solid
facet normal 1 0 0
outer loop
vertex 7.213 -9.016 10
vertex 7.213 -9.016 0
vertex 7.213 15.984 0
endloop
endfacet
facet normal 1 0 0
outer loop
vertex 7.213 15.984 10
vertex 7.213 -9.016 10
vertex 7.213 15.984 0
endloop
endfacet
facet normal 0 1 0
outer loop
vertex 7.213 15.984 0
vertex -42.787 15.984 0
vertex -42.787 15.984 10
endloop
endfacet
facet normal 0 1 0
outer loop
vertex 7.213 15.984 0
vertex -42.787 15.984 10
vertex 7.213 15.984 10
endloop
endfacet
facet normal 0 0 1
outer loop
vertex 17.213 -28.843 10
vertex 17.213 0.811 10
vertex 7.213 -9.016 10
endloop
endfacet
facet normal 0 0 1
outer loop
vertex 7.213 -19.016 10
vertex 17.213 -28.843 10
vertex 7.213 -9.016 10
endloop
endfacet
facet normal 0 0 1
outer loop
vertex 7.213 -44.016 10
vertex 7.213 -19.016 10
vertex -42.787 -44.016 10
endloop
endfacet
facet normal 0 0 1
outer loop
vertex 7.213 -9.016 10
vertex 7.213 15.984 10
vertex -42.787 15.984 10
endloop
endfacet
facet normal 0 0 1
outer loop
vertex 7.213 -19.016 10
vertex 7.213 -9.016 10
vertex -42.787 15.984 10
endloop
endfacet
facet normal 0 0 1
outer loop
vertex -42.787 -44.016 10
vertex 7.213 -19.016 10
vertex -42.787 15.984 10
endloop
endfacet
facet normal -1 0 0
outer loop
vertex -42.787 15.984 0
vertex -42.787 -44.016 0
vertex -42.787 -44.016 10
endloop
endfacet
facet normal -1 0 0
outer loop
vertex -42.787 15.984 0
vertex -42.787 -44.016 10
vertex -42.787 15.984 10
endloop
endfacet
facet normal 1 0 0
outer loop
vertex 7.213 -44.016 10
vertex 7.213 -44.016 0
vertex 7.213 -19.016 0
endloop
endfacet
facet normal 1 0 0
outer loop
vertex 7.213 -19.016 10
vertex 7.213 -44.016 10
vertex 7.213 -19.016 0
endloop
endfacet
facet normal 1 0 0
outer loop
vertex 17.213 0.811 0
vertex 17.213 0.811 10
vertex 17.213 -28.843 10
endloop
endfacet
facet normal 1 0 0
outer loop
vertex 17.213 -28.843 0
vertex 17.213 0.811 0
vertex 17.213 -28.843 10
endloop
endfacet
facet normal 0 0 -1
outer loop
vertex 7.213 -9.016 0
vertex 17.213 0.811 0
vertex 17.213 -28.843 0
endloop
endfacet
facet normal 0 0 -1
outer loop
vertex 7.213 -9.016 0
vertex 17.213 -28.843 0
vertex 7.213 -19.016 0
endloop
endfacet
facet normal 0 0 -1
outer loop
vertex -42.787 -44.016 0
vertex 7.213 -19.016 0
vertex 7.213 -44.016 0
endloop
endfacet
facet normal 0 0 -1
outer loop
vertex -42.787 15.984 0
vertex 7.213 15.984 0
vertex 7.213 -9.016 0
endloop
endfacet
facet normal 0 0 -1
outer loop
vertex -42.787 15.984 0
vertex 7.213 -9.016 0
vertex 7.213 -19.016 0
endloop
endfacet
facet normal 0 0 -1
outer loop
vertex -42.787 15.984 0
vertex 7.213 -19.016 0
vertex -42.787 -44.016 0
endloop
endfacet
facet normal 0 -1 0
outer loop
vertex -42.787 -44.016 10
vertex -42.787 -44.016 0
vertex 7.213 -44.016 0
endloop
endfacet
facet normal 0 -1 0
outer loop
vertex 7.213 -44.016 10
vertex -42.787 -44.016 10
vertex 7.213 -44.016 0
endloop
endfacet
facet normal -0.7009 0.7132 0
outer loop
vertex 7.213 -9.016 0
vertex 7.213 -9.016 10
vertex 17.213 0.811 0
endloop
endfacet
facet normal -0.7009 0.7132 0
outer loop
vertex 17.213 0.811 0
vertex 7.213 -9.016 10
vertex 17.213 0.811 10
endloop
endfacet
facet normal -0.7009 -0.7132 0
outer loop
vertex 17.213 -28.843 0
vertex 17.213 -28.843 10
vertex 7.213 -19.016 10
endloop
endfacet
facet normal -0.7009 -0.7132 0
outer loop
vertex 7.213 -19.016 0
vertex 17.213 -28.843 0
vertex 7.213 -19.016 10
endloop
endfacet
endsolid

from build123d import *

# Parameters (mm, degrees)
SKETCH_2_W      = 50
SKETCH_2_H      = 60
EXTRUDE_1_DEPTH = 10
SKETCH_4_W      = 10
SKETCH_4_H      = 10
EXTRUDE_2_DEPTH = 10
EXTRUDE_3_DEPTH = 10


with BuildPart() as part:
    # 草图2 → 凸台-拉伸1 (new body)
    with BuildSketch(Plane.XY):
        with Locations((-17.786885246, -14.016393443)):
            Rectangle(SKETCH_2_W, SKETCH_2_H)
    extrude(amount=EXTRUDE_1_DEPTH)

    # 草图4 → 凸台-拉伸2 (add)
    with BuildSketch(Plane.XY.offset(10)):
        with Locations((12.213114754, -14.016393443)):
            Rectangle(SKETCH_4_W, SKETCH_4_H)
    extrude(amount=-EXTRUDE_2_DEPTH)

    # 草图5 → 凸台-拉伸3 (add)
    with BuildSketch(Plane.XY.offset(10)):
        Polygon((7.213114754, -9.016393443), (17.213114754, 0.810579189), (17.213114754, -9.016393443), align=None)
        Polygon((7.213114754, -19.016393443), (17.213114754, -19.016393443), (17.213114754, -28.843366074), align=None)
    extrude(amount=-EXTRUDE_3_DEPTH)


solid = part.part
